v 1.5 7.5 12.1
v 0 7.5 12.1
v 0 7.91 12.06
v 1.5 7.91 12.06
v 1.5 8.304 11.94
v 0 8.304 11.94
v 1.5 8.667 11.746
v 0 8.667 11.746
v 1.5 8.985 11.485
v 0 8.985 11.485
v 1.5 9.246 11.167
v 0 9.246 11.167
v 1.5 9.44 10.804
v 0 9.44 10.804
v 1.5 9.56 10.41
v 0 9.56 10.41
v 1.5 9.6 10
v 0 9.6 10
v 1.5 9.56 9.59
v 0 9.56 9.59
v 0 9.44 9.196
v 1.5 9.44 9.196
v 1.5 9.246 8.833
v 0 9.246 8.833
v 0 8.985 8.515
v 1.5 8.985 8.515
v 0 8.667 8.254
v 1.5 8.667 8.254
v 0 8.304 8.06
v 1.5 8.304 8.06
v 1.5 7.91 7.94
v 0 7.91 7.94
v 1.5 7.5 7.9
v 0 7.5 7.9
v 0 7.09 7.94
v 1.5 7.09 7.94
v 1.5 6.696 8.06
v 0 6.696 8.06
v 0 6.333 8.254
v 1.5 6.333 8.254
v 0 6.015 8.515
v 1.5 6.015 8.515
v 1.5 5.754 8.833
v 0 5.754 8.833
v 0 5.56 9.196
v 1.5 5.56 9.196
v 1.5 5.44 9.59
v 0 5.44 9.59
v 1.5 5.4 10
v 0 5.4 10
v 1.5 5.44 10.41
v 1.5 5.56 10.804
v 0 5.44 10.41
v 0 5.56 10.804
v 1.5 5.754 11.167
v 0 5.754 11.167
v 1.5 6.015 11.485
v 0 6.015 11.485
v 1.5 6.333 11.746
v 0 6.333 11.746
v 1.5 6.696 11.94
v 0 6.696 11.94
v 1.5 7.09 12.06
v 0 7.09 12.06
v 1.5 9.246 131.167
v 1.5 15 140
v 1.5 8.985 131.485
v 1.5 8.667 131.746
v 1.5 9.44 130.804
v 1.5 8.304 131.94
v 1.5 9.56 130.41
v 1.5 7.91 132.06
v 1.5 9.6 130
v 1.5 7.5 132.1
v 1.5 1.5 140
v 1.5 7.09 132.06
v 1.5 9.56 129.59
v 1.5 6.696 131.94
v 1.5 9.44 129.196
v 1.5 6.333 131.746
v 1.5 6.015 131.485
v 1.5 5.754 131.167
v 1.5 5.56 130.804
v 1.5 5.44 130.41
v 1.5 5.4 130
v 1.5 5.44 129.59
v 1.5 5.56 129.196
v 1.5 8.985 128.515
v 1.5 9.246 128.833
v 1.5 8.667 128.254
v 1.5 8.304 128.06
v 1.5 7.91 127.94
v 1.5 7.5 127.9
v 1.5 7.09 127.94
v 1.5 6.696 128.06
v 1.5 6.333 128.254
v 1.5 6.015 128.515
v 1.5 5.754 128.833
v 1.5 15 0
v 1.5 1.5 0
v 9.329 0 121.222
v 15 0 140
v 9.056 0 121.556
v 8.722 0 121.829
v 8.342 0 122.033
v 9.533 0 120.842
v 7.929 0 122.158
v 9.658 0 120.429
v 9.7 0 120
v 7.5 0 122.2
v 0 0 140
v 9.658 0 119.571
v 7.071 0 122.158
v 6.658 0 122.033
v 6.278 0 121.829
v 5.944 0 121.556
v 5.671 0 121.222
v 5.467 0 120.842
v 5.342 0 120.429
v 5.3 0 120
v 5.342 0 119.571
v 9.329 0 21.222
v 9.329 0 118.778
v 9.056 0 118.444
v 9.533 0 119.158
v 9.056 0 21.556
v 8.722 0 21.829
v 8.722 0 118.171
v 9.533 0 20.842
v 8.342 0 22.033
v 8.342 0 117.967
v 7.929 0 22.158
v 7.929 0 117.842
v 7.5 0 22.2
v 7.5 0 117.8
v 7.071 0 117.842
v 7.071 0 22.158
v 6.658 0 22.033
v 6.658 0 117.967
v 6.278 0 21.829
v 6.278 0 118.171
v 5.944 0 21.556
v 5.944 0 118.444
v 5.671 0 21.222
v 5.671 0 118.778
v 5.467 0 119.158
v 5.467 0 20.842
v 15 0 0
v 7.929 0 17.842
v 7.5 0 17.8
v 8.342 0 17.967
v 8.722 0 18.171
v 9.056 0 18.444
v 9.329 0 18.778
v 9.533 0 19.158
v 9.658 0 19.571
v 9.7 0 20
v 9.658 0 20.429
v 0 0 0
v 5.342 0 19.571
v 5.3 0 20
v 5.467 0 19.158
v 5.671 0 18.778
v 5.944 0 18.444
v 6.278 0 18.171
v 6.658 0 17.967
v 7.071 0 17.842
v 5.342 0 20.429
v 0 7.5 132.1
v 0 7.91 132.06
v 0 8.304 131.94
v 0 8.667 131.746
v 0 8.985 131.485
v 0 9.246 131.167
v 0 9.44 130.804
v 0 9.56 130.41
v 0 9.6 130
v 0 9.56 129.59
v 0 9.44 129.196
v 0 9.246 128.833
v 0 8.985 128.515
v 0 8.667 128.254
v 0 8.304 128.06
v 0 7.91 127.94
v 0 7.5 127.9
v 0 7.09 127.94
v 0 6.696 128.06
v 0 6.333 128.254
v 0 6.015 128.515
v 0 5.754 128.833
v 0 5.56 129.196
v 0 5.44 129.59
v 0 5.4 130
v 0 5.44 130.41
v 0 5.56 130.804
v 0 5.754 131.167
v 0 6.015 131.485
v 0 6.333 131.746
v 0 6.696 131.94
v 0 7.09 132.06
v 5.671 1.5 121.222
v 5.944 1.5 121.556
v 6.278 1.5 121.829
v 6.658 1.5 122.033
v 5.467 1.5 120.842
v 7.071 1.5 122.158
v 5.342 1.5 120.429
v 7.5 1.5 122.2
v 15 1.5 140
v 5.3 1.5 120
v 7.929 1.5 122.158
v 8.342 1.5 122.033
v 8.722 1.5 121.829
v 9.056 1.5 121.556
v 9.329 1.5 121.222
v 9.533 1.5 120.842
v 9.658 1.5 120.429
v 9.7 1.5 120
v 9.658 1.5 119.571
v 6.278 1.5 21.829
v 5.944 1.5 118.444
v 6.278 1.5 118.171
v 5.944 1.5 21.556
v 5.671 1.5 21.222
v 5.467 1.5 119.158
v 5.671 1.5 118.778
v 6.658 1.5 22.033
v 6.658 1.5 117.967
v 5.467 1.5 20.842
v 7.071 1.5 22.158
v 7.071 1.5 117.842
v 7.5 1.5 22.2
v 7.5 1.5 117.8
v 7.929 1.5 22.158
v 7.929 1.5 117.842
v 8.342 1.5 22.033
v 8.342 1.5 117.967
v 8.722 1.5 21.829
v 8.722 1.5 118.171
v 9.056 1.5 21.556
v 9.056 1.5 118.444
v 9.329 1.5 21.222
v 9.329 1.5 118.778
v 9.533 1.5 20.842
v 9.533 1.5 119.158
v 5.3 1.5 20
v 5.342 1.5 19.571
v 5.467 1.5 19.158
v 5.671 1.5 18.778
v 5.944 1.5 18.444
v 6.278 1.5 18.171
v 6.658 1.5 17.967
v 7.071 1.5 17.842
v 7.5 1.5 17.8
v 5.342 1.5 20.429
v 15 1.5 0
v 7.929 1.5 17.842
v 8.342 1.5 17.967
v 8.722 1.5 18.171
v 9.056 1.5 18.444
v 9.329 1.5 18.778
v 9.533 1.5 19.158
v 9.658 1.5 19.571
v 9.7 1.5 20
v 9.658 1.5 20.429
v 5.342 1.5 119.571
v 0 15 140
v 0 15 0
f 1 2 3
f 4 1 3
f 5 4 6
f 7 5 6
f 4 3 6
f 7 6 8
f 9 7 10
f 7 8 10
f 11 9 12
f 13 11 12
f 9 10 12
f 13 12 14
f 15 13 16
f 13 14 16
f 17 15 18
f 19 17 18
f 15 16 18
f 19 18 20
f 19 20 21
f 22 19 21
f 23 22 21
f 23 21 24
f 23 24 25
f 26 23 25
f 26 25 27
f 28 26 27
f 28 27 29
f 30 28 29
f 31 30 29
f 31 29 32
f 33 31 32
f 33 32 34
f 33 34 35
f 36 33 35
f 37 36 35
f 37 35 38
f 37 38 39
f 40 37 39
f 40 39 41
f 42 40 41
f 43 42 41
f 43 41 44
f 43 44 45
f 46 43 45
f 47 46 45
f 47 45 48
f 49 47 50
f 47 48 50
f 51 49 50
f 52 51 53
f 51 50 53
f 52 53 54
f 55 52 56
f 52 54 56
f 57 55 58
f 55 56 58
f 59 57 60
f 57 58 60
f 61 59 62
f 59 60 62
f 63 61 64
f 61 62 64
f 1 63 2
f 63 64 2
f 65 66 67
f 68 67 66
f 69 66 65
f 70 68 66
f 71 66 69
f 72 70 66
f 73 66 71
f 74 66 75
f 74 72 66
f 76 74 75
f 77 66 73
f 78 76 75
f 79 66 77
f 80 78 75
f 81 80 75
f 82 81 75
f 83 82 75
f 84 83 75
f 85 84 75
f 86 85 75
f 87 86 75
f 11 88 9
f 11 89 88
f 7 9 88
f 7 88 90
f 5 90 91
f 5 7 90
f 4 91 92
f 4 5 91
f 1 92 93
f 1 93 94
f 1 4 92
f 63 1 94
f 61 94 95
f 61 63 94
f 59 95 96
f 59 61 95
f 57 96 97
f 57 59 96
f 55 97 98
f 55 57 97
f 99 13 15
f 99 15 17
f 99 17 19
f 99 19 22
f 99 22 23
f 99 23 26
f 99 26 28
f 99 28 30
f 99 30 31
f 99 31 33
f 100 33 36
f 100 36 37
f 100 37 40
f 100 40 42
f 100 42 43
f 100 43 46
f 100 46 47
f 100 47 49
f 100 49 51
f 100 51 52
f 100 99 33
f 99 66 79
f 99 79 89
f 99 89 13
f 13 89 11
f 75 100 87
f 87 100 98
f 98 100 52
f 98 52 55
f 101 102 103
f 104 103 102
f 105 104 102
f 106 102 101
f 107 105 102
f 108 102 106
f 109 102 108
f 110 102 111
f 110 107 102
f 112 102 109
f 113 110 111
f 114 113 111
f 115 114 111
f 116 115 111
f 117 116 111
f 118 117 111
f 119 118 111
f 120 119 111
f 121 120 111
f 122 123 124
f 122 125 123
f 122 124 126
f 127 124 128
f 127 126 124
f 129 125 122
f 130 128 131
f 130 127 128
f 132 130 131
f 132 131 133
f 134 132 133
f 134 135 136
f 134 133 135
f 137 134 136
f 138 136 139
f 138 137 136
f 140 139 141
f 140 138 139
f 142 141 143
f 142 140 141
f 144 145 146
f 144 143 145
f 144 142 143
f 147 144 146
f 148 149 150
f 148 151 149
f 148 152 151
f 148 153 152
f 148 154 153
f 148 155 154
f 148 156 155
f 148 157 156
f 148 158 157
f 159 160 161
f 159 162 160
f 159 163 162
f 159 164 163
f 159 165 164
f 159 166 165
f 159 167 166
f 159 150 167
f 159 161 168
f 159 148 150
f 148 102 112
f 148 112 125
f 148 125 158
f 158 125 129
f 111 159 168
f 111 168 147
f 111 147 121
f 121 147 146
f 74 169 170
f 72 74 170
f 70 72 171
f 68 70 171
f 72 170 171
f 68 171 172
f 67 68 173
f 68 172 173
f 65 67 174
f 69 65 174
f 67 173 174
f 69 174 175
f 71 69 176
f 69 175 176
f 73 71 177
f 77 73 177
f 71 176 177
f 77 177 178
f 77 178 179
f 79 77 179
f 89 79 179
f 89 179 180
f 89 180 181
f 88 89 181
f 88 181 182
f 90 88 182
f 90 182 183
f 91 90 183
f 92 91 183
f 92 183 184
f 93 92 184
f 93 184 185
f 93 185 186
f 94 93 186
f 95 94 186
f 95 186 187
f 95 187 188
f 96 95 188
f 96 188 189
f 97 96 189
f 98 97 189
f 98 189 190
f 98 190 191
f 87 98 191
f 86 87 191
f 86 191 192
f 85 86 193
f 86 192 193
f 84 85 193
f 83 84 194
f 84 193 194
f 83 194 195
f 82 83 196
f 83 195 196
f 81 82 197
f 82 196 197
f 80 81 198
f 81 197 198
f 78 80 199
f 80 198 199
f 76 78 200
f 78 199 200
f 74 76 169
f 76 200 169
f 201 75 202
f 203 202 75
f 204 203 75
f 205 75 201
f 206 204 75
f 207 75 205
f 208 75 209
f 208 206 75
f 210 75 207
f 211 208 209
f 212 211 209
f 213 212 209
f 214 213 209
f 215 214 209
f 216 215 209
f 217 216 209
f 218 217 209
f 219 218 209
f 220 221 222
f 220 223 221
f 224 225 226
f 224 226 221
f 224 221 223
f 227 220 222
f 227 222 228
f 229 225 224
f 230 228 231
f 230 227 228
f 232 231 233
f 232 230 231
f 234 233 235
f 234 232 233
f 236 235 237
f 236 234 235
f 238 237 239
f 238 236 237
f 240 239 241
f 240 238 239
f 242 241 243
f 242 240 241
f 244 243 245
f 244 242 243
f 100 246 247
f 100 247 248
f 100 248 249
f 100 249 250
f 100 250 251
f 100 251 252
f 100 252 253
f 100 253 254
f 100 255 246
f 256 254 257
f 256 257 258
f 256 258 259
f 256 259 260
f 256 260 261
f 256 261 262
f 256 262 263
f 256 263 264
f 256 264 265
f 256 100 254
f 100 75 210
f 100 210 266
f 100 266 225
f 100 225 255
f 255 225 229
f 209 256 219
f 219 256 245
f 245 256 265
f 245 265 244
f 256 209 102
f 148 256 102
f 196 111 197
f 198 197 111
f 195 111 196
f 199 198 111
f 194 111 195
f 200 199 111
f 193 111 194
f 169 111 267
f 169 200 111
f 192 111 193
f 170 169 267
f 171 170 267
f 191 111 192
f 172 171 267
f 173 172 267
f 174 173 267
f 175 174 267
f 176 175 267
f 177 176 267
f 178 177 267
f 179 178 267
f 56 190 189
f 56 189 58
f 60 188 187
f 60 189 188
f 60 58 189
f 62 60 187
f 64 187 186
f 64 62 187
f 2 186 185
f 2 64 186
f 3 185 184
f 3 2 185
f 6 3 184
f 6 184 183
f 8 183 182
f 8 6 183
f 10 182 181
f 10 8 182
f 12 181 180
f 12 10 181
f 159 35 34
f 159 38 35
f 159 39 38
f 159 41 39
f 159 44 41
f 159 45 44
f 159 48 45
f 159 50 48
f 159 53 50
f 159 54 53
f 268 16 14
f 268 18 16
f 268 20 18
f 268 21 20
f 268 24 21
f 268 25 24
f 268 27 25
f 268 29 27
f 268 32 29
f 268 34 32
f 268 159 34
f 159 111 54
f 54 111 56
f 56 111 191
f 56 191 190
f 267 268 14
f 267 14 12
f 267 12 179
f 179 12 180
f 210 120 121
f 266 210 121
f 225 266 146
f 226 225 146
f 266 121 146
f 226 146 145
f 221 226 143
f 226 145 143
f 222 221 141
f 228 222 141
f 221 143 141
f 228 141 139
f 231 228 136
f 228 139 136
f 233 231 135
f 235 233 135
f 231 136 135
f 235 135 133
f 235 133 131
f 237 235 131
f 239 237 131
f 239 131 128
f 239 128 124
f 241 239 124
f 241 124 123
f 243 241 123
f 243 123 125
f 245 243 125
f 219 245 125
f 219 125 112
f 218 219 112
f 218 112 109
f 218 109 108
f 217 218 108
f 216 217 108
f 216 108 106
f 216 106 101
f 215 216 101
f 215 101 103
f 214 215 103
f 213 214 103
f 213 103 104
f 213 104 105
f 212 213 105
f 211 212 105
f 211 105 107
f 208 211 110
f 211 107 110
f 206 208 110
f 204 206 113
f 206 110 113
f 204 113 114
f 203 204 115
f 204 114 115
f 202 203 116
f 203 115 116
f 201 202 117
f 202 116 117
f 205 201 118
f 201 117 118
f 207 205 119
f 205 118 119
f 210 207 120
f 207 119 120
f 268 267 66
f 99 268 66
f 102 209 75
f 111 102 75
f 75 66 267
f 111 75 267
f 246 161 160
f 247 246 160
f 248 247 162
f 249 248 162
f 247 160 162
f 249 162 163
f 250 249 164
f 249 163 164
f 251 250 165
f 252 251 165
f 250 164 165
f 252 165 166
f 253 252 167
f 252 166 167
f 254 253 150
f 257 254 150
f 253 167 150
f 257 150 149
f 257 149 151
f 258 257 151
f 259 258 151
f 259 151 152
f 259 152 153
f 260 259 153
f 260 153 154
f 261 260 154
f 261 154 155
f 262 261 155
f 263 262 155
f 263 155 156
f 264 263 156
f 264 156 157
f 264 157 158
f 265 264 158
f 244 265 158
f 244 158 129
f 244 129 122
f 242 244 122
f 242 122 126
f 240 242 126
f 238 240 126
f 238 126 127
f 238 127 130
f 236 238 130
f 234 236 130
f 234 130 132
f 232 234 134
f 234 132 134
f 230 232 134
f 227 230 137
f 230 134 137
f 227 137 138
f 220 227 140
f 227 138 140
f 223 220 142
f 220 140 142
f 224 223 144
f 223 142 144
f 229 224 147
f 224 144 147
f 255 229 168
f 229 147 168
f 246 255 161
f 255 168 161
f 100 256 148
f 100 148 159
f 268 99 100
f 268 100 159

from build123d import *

# Parameters (mm, degrees)
EXTRUDE_1_DEPTH     = 140
SKETCH_2_R          = 2.1
CUT_EXTRUDE_1_DEPTH = 140
SKETCH_3_R          = 2.2
CUT_EXTRUDE_2_DEPTH = 140


with BuildPart() as part:
    # ｽｹｯﾁ1 → ﾎﾞｽ - 押し出し1 (new body)
    with BuildSketch(Plane.XY):
        Polygon((0, 0), (0, 15), (1.5, 15), (1.5, 1.5), (15, 1.5), (15, 0), align=None)
    extrude(amount=EXTRUDE_1_DEPTH)

    # ｽｹｯﾁ2 → ｶｯﾄ - 押し出し1 (cut)
    with BuildSketch(Plane.ZY):
        with Locations((130, 7.5)):
            Circle(SKETCH_2_R)
        with Locations((10, 7.5)):
            Circle(SKETCH_2_R)
    extrude(amount=-CUT_EXTRUDE_1_DEPTH, mode=Mode.SUBTRACT)

    # ｽｹｯﾁ3 → ｶｯﾄ - 押し出し2 (cut)
    with BuildSketch(Plane(origin=(0, 0, 0), x_dir=(-1, 0, 0), z_dir=(0, -1, 0))):
        with Locations((-7.5, -120)):
            Circle(SKETCH_3_R)
        with Locations((-7.5, -20)):
            Circle(SKETCH_3_R)
    extrude(amount=-CUT_EXTRUDE_2_DEPTH, mode=Mode.SUBTRACT)


solid = part.part
